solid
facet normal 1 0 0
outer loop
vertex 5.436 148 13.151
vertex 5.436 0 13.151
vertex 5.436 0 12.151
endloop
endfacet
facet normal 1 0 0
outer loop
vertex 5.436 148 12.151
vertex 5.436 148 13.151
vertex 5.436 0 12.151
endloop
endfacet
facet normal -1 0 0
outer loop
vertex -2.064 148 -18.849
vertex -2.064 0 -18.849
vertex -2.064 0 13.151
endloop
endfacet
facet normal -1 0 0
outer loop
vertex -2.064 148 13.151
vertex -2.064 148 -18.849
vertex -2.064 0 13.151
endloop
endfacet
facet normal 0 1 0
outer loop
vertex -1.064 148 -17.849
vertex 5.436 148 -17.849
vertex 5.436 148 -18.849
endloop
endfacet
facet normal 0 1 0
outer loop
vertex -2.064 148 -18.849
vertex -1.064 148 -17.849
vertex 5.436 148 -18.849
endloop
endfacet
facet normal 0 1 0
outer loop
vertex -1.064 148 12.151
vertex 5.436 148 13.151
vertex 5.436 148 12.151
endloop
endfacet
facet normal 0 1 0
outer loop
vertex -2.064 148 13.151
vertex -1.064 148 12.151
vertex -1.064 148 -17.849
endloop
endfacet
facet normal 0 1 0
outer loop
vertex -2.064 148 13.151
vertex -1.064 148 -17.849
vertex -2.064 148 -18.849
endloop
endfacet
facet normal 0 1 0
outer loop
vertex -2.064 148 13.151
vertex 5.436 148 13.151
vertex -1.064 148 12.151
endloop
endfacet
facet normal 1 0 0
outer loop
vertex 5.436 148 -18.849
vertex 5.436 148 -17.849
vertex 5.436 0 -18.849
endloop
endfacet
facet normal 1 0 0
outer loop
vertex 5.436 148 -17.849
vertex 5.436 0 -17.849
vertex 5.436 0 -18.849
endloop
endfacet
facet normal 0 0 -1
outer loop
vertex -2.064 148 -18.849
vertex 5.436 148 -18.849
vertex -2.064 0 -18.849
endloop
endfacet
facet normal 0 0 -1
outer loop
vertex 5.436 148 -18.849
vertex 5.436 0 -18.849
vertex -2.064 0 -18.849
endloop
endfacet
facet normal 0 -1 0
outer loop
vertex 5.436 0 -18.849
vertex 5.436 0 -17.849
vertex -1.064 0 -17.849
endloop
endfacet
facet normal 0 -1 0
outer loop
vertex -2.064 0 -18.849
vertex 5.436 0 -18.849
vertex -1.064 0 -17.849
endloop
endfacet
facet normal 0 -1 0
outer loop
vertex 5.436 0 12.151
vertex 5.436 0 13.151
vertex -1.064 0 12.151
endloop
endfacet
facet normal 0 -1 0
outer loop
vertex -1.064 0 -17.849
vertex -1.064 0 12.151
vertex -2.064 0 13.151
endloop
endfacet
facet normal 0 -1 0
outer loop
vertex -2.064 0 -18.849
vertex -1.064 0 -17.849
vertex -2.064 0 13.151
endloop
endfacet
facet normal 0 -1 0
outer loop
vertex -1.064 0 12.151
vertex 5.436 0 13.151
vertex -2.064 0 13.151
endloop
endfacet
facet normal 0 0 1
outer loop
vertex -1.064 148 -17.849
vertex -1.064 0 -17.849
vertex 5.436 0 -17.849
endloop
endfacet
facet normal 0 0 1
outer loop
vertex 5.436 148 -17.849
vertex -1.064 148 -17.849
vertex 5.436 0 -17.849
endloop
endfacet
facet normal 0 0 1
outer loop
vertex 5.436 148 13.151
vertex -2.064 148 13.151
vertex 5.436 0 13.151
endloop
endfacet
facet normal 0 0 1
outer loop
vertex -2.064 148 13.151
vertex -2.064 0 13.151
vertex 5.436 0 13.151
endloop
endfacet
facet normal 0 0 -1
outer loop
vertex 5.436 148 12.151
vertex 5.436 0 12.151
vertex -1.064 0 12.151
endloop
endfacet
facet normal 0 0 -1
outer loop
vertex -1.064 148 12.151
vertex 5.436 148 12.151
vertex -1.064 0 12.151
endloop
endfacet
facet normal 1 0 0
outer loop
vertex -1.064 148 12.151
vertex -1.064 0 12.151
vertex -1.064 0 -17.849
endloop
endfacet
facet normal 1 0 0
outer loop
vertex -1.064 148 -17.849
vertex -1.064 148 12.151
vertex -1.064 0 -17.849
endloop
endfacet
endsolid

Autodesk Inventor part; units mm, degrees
ref_plane "YZ Plane" through (0, 0, 0) normal (1, 0, 0) x (0, 1, 0)
ref_plane "XZ Plane" through (0, 0, 0) normal (0, 1, 0) x (-1, 0, 0)
ref_plane "XY Plane" through (0, 0, 0) normal (0, 0, 1) x (1, 0, 0)
sketch "Boceto1" plane through (0, 0, 0) normal (0, 1, 0) x (-1, 0, 0)
  line L0 (-5.4361, 12.1513) -> (1.0639, 12.1513)
  line L1 (1.0639, 12.1513) -> (1.0639, -17.8487)
  line L2 (1.0639, -17.8487) -> (-5.4361, -17.8487)
  line L3 (-5.4361, -17.8487) -> (-5.4361, -18.8487)
  line L4 (-5.4361, -18.8487) -> (2.0639, -18.8487)
  line L5 (2.0639, -18.8487) -> (2.0639, 13.1513)
  line L6 (2.0639, 13.1513) -> (-5.4361, 13.1513)
  line L7 (-5.4361, 13.1513) -> (-5.4361, 12.1513)
  point P0 (0, 0)
  point P1 (0, 0)
  dimension "d0" = 6.5
  dimension "d1" = 30
  dimension "d2" = 1
  dimension "d3" = 7.5
  dimension "d4" = 32
extrude "Extrusión1" add sketch "Boceto1" along normal blind 148
properties part number "Tapa cable canal 150mm"
